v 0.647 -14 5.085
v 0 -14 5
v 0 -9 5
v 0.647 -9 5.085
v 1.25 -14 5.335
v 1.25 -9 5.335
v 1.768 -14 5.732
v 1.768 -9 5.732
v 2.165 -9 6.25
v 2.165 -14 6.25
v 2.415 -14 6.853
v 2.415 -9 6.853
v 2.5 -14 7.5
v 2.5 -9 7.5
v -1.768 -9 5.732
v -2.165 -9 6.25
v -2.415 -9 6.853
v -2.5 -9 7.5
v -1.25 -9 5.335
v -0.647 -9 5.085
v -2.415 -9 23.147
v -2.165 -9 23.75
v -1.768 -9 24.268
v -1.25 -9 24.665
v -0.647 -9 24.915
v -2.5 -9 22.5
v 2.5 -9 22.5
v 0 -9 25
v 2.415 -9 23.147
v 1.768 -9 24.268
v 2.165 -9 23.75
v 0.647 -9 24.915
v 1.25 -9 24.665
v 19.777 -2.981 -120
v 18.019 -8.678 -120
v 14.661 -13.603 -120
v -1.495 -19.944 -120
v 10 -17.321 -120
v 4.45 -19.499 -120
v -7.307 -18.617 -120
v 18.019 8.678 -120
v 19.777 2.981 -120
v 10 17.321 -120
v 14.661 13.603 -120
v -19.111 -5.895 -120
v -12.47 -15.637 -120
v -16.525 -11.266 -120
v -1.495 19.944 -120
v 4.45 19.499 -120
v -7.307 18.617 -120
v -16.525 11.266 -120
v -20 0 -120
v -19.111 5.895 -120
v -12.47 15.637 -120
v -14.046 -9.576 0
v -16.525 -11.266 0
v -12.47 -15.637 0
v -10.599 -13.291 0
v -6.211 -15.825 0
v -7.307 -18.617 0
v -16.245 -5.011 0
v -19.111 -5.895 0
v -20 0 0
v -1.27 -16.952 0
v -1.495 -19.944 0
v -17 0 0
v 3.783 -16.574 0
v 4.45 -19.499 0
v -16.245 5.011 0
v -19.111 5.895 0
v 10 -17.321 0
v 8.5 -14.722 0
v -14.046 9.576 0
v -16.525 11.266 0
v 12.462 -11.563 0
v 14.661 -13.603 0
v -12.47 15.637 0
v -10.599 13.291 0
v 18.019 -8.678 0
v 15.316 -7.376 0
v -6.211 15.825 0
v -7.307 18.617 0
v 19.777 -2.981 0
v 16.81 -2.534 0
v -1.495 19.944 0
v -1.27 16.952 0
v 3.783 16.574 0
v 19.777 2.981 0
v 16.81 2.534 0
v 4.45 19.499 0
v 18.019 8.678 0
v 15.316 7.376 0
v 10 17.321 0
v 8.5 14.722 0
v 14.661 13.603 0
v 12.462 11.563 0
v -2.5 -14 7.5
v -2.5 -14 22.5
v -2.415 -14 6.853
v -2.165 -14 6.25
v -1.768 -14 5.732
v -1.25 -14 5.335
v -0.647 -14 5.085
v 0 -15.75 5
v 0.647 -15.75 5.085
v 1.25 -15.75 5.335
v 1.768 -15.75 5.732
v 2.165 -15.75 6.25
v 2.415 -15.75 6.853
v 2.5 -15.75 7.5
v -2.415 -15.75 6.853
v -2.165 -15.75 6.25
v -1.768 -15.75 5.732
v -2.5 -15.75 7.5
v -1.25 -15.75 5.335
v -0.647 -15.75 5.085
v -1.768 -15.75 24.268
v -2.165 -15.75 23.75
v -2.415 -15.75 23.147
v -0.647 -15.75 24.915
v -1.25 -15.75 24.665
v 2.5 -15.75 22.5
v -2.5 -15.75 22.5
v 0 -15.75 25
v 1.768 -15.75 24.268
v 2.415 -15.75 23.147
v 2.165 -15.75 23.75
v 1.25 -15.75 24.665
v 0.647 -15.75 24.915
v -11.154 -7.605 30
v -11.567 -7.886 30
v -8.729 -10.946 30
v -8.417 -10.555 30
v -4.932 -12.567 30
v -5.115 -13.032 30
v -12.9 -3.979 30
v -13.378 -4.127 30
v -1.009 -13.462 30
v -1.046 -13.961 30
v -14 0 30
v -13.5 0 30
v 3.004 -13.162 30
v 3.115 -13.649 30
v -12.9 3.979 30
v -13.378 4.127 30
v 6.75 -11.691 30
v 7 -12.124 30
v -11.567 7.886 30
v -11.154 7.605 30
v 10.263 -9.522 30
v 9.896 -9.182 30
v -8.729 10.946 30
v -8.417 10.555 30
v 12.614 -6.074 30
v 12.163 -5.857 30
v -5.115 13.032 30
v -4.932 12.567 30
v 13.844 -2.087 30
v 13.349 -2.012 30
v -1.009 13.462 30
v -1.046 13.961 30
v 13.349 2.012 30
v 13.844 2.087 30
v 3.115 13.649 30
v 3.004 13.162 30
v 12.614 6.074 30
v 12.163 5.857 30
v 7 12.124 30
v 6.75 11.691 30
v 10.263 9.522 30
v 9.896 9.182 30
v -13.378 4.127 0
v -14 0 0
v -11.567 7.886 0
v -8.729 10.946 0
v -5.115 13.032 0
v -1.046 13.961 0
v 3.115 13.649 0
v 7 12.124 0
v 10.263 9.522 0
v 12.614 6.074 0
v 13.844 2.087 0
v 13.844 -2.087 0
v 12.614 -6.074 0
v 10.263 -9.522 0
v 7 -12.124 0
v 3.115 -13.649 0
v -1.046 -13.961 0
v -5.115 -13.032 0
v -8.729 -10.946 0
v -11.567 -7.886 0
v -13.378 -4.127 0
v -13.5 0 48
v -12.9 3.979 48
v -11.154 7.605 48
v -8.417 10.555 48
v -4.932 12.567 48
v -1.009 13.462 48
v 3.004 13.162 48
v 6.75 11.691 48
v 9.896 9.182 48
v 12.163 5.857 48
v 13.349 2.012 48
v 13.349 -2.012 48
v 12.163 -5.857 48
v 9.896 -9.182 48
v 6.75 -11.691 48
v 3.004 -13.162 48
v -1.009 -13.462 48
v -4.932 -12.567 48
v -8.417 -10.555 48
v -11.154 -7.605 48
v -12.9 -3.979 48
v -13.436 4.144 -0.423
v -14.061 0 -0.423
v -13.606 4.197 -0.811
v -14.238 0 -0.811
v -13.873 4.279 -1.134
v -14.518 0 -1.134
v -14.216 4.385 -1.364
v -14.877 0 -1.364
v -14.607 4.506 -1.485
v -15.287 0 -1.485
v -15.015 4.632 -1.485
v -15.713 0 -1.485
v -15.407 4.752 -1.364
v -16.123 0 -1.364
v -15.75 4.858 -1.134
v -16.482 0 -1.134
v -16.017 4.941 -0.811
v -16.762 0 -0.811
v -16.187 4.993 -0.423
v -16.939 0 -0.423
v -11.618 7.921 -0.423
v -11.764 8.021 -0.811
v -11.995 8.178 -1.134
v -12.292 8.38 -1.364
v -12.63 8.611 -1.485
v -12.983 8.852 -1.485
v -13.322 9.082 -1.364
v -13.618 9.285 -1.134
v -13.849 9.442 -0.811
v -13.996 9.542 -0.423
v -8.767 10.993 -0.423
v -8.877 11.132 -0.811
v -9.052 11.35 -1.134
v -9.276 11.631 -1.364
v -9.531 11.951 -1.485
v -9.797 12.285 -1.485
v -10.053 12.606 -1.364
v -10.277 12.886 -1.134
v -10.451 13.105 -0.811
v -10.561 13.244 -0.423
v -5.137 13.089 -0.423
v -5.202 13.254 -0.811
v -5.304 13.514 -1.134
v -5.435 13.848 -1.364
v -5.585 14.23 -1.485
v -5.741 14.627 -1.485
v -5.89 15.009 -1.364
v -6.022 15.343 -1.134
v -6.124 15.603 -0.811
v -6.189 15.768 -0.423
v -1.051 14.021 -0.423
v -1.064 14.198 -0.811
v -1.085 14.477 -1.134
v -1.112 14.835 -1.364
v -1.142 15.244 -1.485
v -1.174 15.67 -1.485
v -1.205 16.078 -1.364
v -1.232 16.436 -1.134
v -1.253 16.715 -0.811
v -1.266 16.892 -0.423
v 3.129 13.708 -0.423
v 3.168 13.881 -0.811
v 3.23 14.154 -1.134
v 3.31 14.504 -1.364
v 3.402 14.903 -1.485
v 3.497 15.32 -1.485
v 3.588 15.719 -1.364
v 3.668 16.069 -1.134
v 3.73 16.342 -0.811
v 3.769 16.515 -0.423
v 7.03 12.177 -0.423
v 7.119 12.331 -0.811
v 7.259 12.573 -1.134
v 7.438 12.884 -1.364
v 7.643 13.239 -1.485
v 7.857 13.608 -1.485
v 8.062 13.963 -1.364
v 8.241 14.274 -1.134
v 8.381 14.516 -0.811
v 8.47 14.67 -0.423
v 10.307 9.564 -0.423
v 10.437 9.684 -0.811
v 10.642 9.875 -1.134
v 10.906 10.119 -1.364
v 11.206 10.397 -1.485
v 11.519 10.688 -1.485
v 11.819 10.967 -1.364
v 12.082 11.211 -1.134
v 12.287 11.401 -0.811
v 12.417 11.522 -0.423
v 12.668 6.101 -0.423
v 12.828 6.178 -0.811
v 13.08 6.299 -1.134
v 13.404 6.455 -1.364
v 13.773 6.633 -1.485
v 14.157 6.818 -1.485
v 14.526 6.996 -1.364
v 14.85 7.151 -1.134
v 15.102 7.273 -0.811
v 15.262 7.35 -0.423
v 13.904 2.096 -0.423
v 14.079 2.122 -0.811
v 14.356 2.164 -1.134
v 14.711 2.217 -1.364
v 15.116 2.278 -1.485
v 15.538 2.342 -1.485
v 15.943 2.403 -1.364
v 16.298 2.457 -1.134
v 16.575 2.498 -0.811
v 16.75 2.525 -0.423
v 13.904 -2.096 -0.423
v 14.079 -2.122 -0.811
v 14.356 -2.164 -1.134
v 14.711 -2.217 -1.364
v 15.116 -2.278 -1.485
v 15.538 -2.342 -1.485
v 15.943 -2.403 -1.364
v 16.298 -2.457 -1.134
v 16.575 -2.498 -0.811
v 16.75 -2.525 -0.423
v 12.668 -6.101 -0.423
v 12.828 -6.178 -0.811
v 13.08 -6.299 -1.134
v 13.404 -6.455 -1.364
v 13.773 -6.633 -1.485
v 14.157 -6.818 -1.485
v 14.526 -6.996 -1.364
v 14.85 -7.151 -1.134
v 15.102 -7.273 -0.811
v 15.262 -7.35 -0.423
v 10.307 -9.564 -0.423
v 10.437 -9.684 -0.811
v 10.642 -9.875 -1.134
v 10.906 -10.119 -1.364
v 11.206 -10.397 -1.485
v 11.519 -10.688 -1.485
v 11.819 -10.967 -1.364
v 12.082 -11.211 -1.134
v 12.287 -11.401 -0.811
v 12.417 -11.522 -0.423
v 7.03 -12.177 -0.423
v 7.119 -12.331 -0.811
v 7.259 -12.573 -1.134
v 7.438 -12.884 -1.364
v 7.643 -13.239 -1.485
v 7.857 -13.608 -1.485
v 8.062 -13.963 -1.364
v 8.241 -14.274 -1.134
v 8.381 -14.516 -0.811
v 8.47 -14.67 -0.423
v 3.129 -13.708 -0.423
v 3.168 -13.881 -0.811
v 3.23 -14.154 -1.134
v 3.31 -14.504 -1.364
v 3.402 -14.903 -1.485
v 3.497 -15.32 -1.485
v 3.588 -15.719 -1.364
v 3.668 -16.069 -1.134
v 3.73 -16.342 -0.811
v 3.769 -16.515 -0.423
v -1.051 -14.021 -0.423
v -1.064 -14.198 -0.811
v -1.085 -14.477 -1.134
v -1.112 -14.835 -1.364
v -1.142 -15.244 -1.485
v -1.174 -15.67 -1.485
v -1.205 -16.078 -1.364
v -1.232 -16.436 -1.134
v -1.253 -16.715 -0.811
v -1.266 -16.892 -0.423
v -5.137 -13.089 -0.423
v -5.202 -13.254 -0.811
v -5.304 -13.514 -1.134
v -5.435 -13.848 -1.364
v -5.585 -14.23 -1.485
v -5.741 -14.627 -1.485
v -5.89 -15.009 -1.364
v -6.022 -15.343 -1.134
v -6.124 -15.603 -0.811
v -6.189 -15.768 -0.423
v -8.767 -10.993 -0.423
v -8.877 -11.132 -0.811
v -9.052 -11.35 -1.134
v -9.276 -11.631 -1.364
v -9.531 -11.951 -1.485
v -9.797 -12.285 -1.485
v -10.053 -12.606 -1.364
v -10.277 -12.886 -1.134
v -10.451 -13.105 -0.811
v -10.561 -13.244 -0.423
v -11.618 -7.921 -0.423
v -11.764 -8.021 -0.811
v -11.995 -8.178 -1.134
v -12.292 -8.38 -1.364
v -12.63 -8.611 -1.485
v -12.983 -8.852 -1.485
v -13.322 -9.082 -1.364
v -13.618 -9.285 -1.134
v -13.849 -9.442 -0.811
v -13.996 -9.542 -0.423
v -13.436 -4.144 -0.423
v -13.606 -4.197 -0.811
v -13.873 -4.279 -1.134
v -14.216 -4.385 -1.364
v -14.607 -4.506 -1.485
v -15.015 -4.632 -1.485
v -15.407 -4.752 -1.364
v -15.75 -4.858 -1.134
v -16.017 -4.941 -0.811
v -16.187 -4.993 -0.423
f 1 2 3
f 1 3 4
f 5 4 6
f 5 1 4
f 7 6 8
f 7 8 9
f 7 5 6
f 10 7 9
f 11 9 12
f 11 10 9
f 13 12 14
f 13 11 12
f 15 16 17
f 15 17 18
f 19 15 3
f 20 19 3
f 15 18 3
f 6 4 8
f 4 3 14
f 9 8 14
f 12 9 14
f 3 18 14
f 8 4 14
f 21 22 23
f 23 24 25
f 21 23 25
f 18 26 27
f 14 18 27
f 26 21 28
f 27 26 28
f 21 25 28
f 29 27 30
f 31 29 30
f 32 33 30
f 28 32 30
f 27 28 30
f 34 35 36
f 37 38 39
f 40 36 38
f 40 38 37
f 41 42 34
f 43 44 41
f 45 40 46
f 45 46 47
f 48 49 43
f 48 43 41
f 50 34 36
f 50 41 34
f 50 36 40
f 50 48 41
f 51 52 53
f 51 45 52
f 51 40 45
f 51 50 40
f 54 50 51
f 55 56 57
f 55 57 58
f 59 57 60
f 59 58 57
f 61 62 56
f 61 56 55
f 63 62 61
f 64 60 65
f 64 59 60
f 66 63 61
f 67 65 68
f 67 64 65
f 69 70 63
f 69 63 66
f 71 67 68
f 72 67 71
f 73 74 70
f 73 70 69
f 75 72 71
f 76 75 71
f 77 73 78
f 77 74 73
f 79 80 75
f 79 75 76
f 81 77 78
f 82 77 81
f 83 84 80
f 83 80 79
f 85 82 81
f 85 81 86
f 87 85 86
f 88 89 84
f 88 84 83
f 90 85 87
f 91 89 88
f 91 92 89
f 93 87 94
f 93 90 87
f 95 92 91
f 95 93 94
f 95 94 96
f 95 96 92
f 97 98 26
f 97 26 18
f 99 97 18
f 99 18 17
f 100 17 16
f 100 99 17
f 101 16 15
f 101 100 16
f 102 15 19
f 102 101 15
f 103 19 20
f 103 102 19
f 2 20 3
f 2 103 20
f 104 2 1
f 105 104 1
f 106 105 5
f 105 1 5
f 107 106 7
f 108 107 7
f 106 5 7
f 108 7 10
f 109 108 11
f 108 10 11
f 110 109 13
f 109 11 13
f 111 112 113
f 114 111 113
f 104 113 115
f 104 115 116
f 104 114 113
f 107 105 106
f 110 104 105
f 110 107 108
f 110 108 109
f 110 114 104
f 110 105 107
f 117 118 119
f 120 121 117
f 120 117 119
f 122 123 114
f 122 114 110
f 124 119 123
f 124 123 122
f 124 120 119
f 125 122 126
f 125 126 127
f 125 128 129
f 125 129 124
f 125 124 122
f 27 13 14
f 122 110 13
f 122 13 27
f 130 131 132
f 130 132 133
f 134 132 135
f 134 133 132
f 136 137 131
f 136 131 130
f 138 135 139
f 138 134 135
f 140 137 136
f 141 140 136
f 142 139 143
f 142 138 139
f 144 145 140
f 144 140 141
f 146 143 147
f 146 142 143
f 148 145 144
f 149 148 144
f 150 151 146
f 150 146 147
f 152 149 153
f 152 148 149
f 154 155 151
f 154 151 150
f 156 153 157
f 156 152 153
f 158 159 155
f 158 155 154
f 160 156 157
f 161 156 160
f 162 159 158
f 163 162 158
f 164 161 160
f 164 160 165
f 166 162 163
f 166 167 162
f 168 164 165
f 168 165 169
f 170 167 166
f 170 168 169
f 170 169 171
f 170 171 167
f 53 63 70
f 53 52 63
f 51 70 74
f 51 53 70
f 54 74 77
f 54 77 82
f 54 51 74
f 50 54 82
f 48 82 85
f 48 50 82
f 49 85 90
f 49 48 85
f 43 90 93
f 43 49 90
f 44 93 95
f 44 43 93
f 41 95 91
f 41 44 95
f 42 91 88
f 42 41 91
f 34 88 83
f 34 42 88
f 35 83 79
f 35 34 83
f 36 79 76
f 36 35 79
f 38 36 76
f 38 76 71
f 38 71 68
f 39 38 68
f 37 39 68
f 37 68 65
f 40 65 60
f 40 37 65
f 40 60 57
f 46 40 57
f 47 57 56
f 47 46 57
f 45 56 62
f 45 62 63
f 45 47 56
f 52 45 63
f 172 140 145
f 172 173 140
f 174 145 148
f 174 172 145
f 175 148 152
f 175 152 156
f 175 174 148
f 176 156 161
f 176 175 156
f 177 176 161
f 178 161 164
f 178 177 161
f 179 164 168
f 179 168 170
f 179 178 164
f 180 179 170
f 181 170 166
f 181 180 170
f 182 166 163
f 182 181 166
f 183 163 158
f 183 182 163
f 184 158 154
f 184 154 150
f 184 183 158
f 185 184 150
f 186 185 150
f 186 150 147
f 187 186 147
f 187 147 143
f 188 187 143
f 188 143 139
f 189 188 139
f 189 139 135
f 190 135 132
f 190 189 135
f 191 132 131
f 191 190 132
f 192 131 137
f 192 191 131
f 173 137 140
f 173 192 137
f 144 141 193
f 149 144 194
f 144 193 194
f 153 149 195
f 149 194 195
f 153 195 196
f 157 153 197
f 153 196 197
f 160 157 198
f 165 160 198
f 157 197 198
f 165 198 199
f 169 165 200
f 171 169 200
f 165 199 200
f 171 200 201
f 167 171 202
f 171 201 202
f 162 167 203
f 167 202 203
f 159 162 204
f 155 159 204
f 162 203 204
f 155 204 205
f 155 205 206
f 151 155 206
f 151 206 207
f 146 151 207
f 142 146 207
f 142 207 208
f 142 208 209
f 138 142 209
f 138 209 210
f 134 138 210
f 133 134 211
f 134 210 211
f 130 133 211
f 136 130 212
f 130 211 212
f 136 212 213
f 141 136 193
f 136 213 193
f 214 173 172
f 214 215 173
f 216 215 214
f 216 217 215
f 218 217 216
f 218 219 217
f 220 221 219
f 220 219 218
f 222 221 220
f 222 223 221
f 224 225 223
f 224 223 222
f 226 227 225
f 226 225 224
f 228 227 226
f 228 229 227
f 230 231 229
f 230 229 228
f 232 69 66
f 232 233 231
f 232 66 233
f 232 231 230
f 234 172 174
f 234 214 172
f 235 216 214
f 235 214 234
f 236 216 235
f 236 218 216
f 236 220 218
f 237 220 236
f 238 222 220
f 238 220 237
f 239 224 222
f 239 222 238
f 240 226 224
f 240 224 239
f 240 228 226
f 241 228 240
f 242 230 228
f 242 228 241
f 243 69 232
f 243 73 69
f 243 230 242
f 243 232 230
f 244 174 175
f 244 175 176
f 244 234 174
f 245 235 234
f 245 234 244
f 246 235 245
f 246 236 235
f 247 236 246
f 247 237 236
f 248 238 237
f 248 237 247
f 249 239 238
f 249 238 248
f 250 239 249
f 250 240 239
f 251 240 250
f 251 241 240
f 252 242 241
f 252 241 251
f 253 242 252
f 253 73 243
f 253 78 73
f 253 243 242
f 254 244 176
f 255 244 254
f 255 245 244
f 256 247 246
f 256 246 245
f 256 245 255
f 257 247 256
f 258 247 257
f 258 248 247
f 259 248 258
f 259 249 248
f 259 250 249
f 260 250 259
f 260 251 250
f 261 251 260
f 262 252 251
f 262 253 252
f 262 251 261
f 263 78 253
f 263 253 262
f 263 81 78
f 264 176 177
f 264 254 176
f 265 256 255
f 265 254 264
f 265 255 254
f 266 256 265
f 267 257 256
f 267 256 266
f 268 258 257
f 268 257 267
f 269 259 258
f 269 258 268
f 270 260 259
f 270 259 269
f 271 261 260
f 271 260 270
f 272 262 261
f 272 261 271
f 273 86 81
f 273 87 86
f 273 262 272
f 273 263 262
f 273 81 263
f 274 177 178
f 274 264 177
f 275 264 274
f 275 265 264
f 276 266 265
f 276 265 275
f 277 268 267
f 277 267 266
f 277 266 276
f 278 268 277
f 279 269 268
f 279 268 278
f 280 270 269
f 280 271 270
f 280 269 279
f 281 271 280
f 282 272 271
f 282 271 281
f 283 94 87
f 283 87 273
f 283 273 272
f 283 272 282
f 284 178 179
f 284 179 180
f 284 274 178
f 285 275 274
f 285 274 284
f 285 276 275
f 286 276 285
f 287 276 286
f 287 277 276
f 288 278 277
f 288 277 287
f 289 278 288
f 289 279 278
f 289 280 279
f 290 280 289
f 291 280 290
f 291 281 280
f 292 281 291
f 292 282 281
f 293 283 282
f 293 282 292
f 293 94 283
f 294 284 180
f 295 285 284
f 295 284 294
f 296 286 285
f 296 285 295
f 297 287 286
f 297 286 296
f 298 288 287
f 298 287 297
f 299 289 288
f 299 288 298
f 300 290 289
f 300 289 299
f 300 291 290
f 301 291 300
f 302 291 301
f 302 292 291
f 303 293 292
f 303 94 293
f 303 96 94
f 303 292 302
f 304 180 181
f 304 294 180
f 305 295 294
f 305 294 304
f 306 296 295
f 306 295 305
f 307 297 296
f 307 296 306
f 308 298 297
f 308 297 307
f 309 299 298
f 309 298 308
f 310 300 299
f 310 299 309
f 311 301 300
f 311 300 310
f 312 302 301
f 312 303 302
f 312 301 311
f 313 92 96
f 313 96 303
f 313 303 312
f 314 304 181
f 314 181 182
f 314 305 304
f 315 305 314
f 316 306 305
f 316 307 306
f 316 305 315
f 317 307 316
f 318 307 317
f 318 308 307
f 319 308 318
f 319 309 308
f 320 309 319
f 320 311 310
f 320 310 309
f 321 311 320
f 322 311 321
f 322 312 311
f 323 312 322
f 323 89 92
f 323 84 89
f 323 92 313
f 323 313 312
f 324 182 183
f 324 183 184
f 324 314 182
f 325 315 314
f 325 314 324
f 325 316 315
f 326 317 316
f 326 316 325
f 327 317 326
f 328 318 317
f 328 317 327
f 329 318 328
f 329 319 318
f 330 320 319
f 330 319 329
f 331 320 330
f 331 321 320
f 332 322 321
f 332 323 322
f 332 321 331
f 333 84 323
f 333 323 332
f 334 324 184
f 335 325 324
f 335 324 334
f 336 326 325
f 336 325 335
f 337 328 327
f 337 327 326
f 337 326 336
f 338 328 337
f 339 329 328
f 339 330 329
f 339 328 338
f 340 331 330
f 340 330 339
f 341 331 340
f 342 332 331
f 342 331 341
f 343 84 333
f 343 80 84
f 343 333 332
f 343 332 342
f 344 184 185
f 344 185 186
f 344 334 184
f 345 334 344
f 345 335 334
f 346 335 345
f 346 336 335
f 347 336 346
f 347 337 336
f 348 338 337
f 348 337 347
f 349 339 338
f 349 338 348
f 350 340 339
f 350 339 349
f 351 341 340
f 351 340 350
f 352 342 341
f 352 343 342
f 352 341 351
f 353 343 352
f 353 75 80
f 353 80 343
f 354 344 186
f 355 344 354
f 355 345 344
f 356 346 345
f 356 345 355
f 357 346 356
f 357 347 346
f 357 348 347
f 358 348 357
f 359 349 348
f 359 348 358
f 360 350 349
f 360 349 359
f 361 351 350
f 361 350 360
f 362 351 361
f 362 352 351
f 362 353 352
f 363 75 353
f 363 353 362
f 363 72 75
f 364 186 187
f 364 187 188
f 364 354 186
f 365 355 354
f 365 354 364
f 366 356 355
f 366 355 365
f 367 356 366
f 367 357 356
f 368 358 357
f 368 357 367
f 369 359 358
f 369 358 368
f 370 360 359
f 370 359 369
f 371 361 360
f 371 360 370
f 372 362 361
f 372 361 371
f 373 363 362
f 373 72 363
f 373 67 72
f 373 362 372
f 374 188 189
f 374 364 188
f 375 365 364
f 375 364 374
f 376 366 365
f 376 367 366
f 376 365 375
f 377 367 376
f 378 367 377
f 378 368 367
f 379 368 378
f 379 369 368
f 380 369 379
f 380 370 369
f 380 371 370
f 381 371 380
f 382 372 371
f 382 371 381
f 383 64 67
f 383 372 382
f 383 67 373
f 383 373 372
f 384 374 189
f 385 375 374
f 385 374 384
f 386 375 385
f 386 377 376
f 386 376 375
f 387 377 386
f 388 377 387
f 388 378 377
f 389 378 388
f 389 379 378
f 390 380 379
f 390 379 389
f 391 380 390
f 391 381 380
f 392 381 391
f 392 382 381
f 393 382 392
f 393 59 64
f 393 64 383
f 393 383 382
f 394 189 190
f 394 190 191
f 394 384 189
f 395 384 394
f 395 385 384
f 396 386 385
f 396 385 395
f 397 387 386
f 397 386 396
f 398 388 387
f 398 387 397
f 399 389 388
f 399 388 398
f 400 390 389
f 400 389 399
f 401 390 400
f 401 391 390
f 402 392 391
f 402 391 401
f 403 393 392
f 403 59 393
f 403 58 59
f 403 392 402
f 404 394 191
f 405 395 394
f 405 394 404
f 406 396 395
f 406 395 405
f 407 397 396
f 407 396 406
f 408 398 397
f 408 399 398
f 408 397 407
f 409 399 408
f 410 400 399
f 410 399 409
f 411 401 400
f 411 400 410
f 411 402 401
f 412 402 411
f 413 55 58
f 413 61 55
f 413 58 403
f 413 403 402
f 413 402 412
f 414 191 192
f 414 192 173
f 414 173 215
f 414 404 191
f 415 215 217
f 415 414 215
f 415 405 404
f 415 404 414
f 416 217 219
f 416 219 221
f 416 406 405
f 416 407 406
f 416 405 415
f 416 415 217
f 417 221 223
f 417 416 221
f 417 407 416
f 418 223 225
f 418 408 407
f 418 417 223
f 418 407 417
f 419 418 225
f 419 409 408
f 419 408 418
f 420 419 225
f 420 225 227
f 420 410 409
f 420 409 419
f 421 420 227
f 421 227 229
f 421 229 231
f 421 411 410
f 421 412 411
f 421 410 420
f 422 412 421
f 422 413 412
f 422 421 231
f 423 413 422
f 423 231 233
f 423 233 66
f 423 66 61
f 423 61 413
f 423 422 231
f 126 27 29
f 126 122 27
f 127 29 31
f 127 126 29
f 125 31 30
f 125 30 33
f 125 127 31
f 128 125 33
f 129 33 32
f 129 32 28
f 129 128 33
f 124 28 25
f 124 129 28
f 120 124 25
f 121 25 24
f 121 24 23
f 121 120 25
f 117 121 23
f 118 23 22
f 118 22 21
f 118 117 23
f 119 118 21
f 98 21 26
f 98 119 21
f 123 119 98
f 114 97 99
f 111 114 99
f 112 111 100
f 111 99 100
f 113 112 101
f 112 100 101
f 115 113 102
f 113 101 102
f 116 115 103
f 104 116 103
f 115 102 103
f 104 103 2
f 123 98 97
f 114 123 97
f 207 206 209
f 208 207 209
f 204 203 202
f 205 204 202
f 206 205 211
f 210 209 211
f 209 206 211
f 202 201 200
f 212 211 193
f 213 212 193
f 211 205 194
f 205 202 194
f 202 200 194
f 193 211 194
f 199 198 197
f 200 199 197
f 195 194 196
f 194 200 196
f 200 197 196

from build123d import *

# Parameters (mm, degrees)
F0_W          = 13.5
F0_H          = 18
F4_DEPTH      = 1.75
F4_DEPTH_BACK = 5


with BuildPart() as f1:
    # F0 (on Front) → F1 (revolve)
    with BuildSketch(Plane.XZ):
        with BuildLine():
            Line((0, -120), (0, 30))
            Line((0, 30), (-13.5, 30))
            Line((-13.5, 30), (-14, 30))
            Line((-14, 30), (-14, 0))
            ThreePointArc((-14, 0), (-15.5, -1.5), (-17, 0))
            Line((-17, 0), (-20, 0))
            Line((-20, 0), (-20, -120))
            Line((-20, -120), (0, -120))
        make_face()
        with Locations((-6.75, 39)):
            Rectangle(F0_W, F0_H)
    revolve(axis=Axis((0, 0, -45), (0, 0, -1)))


with BuildPart() as f4:
    # F3 (on offset) → F4 (new body, two sides)
    with BuildSketch(Plane.XZ.offset(14)) as f4_sk:
        with BuildLine():
            Line((0, 25), (0, 22.5))
            Line((0, 22.5), (0, 20))
            ThreePointArc((0, 20), (1.767766953, 20.732233047), (2.5, 22.5))
            ThreePointArc((2.5, 22.5), (1.767766953, 24.267766953), (0, 25))
        make_face()
        with BuildLine():
            Line((0, 20), (0, 22.5))
            Line((0, 22.5), (0, 25))
            ThreePointArc((0, 25), (-1.767766953, 24.267766953), (-2.5, 22.5))
            ThreePointArc((-2.5, 22.5), (-1.767766953, 20.732233047), (0, 20))
        make_face()
        with BuildLine():
            ThreePointArc((2.5, 22.5), (1.767766953, 20.732233047), (0, 20))
            Line((0, 20), (0, 10))
            ThreePointArc((0, 10), (1.767766953, 9.267766953), (2.5, 7.5))
            Line((2.5, 7.5), (2.5, 22.5))
        make_face()
        with BuildLine():
            Line((0, 10), (0, 20))
            ThreePointArc((0, 20), (-1.767766953, 20.732233047), (-2.5, 22.5))
            Line((-2.5, 22.5), (-2.5, 7.5))
            ThreePointArc((-2.5, 7.5), (-1.767766953, 9.267766953), (0, 10))
        make_face()
        with BuildLine():
            ThreePointArc((2.5, 7.5), (1.767766953, 9.267766953), (0, 10))
            Line((0, 10), (0, 7.5))
            Line((0, 7.5), (0, 5))
            ThreePointArc((0, 5), (1.767766953, 5.732233047), (2.5, 7.5))
        make_face()
        with BuildLine():
            Line((0, 7.5), (0, 10))
            ThreePointArc((0, 10), (-1.767766953, 9.267766953), (-2.5, 7.5))
            ThreePointArc((-2.5, 7.5), (-1.767766953, 5.732233047), (0, 5))
            Line((0, 5), (0, 7.5))
        make_face()
    extrude(amount=F4_DEPTH)
    extrude(f4_sk.sketch, amount=-F4_DEPTH_BACK)


solid = Compound([f1.part, f4.part])
